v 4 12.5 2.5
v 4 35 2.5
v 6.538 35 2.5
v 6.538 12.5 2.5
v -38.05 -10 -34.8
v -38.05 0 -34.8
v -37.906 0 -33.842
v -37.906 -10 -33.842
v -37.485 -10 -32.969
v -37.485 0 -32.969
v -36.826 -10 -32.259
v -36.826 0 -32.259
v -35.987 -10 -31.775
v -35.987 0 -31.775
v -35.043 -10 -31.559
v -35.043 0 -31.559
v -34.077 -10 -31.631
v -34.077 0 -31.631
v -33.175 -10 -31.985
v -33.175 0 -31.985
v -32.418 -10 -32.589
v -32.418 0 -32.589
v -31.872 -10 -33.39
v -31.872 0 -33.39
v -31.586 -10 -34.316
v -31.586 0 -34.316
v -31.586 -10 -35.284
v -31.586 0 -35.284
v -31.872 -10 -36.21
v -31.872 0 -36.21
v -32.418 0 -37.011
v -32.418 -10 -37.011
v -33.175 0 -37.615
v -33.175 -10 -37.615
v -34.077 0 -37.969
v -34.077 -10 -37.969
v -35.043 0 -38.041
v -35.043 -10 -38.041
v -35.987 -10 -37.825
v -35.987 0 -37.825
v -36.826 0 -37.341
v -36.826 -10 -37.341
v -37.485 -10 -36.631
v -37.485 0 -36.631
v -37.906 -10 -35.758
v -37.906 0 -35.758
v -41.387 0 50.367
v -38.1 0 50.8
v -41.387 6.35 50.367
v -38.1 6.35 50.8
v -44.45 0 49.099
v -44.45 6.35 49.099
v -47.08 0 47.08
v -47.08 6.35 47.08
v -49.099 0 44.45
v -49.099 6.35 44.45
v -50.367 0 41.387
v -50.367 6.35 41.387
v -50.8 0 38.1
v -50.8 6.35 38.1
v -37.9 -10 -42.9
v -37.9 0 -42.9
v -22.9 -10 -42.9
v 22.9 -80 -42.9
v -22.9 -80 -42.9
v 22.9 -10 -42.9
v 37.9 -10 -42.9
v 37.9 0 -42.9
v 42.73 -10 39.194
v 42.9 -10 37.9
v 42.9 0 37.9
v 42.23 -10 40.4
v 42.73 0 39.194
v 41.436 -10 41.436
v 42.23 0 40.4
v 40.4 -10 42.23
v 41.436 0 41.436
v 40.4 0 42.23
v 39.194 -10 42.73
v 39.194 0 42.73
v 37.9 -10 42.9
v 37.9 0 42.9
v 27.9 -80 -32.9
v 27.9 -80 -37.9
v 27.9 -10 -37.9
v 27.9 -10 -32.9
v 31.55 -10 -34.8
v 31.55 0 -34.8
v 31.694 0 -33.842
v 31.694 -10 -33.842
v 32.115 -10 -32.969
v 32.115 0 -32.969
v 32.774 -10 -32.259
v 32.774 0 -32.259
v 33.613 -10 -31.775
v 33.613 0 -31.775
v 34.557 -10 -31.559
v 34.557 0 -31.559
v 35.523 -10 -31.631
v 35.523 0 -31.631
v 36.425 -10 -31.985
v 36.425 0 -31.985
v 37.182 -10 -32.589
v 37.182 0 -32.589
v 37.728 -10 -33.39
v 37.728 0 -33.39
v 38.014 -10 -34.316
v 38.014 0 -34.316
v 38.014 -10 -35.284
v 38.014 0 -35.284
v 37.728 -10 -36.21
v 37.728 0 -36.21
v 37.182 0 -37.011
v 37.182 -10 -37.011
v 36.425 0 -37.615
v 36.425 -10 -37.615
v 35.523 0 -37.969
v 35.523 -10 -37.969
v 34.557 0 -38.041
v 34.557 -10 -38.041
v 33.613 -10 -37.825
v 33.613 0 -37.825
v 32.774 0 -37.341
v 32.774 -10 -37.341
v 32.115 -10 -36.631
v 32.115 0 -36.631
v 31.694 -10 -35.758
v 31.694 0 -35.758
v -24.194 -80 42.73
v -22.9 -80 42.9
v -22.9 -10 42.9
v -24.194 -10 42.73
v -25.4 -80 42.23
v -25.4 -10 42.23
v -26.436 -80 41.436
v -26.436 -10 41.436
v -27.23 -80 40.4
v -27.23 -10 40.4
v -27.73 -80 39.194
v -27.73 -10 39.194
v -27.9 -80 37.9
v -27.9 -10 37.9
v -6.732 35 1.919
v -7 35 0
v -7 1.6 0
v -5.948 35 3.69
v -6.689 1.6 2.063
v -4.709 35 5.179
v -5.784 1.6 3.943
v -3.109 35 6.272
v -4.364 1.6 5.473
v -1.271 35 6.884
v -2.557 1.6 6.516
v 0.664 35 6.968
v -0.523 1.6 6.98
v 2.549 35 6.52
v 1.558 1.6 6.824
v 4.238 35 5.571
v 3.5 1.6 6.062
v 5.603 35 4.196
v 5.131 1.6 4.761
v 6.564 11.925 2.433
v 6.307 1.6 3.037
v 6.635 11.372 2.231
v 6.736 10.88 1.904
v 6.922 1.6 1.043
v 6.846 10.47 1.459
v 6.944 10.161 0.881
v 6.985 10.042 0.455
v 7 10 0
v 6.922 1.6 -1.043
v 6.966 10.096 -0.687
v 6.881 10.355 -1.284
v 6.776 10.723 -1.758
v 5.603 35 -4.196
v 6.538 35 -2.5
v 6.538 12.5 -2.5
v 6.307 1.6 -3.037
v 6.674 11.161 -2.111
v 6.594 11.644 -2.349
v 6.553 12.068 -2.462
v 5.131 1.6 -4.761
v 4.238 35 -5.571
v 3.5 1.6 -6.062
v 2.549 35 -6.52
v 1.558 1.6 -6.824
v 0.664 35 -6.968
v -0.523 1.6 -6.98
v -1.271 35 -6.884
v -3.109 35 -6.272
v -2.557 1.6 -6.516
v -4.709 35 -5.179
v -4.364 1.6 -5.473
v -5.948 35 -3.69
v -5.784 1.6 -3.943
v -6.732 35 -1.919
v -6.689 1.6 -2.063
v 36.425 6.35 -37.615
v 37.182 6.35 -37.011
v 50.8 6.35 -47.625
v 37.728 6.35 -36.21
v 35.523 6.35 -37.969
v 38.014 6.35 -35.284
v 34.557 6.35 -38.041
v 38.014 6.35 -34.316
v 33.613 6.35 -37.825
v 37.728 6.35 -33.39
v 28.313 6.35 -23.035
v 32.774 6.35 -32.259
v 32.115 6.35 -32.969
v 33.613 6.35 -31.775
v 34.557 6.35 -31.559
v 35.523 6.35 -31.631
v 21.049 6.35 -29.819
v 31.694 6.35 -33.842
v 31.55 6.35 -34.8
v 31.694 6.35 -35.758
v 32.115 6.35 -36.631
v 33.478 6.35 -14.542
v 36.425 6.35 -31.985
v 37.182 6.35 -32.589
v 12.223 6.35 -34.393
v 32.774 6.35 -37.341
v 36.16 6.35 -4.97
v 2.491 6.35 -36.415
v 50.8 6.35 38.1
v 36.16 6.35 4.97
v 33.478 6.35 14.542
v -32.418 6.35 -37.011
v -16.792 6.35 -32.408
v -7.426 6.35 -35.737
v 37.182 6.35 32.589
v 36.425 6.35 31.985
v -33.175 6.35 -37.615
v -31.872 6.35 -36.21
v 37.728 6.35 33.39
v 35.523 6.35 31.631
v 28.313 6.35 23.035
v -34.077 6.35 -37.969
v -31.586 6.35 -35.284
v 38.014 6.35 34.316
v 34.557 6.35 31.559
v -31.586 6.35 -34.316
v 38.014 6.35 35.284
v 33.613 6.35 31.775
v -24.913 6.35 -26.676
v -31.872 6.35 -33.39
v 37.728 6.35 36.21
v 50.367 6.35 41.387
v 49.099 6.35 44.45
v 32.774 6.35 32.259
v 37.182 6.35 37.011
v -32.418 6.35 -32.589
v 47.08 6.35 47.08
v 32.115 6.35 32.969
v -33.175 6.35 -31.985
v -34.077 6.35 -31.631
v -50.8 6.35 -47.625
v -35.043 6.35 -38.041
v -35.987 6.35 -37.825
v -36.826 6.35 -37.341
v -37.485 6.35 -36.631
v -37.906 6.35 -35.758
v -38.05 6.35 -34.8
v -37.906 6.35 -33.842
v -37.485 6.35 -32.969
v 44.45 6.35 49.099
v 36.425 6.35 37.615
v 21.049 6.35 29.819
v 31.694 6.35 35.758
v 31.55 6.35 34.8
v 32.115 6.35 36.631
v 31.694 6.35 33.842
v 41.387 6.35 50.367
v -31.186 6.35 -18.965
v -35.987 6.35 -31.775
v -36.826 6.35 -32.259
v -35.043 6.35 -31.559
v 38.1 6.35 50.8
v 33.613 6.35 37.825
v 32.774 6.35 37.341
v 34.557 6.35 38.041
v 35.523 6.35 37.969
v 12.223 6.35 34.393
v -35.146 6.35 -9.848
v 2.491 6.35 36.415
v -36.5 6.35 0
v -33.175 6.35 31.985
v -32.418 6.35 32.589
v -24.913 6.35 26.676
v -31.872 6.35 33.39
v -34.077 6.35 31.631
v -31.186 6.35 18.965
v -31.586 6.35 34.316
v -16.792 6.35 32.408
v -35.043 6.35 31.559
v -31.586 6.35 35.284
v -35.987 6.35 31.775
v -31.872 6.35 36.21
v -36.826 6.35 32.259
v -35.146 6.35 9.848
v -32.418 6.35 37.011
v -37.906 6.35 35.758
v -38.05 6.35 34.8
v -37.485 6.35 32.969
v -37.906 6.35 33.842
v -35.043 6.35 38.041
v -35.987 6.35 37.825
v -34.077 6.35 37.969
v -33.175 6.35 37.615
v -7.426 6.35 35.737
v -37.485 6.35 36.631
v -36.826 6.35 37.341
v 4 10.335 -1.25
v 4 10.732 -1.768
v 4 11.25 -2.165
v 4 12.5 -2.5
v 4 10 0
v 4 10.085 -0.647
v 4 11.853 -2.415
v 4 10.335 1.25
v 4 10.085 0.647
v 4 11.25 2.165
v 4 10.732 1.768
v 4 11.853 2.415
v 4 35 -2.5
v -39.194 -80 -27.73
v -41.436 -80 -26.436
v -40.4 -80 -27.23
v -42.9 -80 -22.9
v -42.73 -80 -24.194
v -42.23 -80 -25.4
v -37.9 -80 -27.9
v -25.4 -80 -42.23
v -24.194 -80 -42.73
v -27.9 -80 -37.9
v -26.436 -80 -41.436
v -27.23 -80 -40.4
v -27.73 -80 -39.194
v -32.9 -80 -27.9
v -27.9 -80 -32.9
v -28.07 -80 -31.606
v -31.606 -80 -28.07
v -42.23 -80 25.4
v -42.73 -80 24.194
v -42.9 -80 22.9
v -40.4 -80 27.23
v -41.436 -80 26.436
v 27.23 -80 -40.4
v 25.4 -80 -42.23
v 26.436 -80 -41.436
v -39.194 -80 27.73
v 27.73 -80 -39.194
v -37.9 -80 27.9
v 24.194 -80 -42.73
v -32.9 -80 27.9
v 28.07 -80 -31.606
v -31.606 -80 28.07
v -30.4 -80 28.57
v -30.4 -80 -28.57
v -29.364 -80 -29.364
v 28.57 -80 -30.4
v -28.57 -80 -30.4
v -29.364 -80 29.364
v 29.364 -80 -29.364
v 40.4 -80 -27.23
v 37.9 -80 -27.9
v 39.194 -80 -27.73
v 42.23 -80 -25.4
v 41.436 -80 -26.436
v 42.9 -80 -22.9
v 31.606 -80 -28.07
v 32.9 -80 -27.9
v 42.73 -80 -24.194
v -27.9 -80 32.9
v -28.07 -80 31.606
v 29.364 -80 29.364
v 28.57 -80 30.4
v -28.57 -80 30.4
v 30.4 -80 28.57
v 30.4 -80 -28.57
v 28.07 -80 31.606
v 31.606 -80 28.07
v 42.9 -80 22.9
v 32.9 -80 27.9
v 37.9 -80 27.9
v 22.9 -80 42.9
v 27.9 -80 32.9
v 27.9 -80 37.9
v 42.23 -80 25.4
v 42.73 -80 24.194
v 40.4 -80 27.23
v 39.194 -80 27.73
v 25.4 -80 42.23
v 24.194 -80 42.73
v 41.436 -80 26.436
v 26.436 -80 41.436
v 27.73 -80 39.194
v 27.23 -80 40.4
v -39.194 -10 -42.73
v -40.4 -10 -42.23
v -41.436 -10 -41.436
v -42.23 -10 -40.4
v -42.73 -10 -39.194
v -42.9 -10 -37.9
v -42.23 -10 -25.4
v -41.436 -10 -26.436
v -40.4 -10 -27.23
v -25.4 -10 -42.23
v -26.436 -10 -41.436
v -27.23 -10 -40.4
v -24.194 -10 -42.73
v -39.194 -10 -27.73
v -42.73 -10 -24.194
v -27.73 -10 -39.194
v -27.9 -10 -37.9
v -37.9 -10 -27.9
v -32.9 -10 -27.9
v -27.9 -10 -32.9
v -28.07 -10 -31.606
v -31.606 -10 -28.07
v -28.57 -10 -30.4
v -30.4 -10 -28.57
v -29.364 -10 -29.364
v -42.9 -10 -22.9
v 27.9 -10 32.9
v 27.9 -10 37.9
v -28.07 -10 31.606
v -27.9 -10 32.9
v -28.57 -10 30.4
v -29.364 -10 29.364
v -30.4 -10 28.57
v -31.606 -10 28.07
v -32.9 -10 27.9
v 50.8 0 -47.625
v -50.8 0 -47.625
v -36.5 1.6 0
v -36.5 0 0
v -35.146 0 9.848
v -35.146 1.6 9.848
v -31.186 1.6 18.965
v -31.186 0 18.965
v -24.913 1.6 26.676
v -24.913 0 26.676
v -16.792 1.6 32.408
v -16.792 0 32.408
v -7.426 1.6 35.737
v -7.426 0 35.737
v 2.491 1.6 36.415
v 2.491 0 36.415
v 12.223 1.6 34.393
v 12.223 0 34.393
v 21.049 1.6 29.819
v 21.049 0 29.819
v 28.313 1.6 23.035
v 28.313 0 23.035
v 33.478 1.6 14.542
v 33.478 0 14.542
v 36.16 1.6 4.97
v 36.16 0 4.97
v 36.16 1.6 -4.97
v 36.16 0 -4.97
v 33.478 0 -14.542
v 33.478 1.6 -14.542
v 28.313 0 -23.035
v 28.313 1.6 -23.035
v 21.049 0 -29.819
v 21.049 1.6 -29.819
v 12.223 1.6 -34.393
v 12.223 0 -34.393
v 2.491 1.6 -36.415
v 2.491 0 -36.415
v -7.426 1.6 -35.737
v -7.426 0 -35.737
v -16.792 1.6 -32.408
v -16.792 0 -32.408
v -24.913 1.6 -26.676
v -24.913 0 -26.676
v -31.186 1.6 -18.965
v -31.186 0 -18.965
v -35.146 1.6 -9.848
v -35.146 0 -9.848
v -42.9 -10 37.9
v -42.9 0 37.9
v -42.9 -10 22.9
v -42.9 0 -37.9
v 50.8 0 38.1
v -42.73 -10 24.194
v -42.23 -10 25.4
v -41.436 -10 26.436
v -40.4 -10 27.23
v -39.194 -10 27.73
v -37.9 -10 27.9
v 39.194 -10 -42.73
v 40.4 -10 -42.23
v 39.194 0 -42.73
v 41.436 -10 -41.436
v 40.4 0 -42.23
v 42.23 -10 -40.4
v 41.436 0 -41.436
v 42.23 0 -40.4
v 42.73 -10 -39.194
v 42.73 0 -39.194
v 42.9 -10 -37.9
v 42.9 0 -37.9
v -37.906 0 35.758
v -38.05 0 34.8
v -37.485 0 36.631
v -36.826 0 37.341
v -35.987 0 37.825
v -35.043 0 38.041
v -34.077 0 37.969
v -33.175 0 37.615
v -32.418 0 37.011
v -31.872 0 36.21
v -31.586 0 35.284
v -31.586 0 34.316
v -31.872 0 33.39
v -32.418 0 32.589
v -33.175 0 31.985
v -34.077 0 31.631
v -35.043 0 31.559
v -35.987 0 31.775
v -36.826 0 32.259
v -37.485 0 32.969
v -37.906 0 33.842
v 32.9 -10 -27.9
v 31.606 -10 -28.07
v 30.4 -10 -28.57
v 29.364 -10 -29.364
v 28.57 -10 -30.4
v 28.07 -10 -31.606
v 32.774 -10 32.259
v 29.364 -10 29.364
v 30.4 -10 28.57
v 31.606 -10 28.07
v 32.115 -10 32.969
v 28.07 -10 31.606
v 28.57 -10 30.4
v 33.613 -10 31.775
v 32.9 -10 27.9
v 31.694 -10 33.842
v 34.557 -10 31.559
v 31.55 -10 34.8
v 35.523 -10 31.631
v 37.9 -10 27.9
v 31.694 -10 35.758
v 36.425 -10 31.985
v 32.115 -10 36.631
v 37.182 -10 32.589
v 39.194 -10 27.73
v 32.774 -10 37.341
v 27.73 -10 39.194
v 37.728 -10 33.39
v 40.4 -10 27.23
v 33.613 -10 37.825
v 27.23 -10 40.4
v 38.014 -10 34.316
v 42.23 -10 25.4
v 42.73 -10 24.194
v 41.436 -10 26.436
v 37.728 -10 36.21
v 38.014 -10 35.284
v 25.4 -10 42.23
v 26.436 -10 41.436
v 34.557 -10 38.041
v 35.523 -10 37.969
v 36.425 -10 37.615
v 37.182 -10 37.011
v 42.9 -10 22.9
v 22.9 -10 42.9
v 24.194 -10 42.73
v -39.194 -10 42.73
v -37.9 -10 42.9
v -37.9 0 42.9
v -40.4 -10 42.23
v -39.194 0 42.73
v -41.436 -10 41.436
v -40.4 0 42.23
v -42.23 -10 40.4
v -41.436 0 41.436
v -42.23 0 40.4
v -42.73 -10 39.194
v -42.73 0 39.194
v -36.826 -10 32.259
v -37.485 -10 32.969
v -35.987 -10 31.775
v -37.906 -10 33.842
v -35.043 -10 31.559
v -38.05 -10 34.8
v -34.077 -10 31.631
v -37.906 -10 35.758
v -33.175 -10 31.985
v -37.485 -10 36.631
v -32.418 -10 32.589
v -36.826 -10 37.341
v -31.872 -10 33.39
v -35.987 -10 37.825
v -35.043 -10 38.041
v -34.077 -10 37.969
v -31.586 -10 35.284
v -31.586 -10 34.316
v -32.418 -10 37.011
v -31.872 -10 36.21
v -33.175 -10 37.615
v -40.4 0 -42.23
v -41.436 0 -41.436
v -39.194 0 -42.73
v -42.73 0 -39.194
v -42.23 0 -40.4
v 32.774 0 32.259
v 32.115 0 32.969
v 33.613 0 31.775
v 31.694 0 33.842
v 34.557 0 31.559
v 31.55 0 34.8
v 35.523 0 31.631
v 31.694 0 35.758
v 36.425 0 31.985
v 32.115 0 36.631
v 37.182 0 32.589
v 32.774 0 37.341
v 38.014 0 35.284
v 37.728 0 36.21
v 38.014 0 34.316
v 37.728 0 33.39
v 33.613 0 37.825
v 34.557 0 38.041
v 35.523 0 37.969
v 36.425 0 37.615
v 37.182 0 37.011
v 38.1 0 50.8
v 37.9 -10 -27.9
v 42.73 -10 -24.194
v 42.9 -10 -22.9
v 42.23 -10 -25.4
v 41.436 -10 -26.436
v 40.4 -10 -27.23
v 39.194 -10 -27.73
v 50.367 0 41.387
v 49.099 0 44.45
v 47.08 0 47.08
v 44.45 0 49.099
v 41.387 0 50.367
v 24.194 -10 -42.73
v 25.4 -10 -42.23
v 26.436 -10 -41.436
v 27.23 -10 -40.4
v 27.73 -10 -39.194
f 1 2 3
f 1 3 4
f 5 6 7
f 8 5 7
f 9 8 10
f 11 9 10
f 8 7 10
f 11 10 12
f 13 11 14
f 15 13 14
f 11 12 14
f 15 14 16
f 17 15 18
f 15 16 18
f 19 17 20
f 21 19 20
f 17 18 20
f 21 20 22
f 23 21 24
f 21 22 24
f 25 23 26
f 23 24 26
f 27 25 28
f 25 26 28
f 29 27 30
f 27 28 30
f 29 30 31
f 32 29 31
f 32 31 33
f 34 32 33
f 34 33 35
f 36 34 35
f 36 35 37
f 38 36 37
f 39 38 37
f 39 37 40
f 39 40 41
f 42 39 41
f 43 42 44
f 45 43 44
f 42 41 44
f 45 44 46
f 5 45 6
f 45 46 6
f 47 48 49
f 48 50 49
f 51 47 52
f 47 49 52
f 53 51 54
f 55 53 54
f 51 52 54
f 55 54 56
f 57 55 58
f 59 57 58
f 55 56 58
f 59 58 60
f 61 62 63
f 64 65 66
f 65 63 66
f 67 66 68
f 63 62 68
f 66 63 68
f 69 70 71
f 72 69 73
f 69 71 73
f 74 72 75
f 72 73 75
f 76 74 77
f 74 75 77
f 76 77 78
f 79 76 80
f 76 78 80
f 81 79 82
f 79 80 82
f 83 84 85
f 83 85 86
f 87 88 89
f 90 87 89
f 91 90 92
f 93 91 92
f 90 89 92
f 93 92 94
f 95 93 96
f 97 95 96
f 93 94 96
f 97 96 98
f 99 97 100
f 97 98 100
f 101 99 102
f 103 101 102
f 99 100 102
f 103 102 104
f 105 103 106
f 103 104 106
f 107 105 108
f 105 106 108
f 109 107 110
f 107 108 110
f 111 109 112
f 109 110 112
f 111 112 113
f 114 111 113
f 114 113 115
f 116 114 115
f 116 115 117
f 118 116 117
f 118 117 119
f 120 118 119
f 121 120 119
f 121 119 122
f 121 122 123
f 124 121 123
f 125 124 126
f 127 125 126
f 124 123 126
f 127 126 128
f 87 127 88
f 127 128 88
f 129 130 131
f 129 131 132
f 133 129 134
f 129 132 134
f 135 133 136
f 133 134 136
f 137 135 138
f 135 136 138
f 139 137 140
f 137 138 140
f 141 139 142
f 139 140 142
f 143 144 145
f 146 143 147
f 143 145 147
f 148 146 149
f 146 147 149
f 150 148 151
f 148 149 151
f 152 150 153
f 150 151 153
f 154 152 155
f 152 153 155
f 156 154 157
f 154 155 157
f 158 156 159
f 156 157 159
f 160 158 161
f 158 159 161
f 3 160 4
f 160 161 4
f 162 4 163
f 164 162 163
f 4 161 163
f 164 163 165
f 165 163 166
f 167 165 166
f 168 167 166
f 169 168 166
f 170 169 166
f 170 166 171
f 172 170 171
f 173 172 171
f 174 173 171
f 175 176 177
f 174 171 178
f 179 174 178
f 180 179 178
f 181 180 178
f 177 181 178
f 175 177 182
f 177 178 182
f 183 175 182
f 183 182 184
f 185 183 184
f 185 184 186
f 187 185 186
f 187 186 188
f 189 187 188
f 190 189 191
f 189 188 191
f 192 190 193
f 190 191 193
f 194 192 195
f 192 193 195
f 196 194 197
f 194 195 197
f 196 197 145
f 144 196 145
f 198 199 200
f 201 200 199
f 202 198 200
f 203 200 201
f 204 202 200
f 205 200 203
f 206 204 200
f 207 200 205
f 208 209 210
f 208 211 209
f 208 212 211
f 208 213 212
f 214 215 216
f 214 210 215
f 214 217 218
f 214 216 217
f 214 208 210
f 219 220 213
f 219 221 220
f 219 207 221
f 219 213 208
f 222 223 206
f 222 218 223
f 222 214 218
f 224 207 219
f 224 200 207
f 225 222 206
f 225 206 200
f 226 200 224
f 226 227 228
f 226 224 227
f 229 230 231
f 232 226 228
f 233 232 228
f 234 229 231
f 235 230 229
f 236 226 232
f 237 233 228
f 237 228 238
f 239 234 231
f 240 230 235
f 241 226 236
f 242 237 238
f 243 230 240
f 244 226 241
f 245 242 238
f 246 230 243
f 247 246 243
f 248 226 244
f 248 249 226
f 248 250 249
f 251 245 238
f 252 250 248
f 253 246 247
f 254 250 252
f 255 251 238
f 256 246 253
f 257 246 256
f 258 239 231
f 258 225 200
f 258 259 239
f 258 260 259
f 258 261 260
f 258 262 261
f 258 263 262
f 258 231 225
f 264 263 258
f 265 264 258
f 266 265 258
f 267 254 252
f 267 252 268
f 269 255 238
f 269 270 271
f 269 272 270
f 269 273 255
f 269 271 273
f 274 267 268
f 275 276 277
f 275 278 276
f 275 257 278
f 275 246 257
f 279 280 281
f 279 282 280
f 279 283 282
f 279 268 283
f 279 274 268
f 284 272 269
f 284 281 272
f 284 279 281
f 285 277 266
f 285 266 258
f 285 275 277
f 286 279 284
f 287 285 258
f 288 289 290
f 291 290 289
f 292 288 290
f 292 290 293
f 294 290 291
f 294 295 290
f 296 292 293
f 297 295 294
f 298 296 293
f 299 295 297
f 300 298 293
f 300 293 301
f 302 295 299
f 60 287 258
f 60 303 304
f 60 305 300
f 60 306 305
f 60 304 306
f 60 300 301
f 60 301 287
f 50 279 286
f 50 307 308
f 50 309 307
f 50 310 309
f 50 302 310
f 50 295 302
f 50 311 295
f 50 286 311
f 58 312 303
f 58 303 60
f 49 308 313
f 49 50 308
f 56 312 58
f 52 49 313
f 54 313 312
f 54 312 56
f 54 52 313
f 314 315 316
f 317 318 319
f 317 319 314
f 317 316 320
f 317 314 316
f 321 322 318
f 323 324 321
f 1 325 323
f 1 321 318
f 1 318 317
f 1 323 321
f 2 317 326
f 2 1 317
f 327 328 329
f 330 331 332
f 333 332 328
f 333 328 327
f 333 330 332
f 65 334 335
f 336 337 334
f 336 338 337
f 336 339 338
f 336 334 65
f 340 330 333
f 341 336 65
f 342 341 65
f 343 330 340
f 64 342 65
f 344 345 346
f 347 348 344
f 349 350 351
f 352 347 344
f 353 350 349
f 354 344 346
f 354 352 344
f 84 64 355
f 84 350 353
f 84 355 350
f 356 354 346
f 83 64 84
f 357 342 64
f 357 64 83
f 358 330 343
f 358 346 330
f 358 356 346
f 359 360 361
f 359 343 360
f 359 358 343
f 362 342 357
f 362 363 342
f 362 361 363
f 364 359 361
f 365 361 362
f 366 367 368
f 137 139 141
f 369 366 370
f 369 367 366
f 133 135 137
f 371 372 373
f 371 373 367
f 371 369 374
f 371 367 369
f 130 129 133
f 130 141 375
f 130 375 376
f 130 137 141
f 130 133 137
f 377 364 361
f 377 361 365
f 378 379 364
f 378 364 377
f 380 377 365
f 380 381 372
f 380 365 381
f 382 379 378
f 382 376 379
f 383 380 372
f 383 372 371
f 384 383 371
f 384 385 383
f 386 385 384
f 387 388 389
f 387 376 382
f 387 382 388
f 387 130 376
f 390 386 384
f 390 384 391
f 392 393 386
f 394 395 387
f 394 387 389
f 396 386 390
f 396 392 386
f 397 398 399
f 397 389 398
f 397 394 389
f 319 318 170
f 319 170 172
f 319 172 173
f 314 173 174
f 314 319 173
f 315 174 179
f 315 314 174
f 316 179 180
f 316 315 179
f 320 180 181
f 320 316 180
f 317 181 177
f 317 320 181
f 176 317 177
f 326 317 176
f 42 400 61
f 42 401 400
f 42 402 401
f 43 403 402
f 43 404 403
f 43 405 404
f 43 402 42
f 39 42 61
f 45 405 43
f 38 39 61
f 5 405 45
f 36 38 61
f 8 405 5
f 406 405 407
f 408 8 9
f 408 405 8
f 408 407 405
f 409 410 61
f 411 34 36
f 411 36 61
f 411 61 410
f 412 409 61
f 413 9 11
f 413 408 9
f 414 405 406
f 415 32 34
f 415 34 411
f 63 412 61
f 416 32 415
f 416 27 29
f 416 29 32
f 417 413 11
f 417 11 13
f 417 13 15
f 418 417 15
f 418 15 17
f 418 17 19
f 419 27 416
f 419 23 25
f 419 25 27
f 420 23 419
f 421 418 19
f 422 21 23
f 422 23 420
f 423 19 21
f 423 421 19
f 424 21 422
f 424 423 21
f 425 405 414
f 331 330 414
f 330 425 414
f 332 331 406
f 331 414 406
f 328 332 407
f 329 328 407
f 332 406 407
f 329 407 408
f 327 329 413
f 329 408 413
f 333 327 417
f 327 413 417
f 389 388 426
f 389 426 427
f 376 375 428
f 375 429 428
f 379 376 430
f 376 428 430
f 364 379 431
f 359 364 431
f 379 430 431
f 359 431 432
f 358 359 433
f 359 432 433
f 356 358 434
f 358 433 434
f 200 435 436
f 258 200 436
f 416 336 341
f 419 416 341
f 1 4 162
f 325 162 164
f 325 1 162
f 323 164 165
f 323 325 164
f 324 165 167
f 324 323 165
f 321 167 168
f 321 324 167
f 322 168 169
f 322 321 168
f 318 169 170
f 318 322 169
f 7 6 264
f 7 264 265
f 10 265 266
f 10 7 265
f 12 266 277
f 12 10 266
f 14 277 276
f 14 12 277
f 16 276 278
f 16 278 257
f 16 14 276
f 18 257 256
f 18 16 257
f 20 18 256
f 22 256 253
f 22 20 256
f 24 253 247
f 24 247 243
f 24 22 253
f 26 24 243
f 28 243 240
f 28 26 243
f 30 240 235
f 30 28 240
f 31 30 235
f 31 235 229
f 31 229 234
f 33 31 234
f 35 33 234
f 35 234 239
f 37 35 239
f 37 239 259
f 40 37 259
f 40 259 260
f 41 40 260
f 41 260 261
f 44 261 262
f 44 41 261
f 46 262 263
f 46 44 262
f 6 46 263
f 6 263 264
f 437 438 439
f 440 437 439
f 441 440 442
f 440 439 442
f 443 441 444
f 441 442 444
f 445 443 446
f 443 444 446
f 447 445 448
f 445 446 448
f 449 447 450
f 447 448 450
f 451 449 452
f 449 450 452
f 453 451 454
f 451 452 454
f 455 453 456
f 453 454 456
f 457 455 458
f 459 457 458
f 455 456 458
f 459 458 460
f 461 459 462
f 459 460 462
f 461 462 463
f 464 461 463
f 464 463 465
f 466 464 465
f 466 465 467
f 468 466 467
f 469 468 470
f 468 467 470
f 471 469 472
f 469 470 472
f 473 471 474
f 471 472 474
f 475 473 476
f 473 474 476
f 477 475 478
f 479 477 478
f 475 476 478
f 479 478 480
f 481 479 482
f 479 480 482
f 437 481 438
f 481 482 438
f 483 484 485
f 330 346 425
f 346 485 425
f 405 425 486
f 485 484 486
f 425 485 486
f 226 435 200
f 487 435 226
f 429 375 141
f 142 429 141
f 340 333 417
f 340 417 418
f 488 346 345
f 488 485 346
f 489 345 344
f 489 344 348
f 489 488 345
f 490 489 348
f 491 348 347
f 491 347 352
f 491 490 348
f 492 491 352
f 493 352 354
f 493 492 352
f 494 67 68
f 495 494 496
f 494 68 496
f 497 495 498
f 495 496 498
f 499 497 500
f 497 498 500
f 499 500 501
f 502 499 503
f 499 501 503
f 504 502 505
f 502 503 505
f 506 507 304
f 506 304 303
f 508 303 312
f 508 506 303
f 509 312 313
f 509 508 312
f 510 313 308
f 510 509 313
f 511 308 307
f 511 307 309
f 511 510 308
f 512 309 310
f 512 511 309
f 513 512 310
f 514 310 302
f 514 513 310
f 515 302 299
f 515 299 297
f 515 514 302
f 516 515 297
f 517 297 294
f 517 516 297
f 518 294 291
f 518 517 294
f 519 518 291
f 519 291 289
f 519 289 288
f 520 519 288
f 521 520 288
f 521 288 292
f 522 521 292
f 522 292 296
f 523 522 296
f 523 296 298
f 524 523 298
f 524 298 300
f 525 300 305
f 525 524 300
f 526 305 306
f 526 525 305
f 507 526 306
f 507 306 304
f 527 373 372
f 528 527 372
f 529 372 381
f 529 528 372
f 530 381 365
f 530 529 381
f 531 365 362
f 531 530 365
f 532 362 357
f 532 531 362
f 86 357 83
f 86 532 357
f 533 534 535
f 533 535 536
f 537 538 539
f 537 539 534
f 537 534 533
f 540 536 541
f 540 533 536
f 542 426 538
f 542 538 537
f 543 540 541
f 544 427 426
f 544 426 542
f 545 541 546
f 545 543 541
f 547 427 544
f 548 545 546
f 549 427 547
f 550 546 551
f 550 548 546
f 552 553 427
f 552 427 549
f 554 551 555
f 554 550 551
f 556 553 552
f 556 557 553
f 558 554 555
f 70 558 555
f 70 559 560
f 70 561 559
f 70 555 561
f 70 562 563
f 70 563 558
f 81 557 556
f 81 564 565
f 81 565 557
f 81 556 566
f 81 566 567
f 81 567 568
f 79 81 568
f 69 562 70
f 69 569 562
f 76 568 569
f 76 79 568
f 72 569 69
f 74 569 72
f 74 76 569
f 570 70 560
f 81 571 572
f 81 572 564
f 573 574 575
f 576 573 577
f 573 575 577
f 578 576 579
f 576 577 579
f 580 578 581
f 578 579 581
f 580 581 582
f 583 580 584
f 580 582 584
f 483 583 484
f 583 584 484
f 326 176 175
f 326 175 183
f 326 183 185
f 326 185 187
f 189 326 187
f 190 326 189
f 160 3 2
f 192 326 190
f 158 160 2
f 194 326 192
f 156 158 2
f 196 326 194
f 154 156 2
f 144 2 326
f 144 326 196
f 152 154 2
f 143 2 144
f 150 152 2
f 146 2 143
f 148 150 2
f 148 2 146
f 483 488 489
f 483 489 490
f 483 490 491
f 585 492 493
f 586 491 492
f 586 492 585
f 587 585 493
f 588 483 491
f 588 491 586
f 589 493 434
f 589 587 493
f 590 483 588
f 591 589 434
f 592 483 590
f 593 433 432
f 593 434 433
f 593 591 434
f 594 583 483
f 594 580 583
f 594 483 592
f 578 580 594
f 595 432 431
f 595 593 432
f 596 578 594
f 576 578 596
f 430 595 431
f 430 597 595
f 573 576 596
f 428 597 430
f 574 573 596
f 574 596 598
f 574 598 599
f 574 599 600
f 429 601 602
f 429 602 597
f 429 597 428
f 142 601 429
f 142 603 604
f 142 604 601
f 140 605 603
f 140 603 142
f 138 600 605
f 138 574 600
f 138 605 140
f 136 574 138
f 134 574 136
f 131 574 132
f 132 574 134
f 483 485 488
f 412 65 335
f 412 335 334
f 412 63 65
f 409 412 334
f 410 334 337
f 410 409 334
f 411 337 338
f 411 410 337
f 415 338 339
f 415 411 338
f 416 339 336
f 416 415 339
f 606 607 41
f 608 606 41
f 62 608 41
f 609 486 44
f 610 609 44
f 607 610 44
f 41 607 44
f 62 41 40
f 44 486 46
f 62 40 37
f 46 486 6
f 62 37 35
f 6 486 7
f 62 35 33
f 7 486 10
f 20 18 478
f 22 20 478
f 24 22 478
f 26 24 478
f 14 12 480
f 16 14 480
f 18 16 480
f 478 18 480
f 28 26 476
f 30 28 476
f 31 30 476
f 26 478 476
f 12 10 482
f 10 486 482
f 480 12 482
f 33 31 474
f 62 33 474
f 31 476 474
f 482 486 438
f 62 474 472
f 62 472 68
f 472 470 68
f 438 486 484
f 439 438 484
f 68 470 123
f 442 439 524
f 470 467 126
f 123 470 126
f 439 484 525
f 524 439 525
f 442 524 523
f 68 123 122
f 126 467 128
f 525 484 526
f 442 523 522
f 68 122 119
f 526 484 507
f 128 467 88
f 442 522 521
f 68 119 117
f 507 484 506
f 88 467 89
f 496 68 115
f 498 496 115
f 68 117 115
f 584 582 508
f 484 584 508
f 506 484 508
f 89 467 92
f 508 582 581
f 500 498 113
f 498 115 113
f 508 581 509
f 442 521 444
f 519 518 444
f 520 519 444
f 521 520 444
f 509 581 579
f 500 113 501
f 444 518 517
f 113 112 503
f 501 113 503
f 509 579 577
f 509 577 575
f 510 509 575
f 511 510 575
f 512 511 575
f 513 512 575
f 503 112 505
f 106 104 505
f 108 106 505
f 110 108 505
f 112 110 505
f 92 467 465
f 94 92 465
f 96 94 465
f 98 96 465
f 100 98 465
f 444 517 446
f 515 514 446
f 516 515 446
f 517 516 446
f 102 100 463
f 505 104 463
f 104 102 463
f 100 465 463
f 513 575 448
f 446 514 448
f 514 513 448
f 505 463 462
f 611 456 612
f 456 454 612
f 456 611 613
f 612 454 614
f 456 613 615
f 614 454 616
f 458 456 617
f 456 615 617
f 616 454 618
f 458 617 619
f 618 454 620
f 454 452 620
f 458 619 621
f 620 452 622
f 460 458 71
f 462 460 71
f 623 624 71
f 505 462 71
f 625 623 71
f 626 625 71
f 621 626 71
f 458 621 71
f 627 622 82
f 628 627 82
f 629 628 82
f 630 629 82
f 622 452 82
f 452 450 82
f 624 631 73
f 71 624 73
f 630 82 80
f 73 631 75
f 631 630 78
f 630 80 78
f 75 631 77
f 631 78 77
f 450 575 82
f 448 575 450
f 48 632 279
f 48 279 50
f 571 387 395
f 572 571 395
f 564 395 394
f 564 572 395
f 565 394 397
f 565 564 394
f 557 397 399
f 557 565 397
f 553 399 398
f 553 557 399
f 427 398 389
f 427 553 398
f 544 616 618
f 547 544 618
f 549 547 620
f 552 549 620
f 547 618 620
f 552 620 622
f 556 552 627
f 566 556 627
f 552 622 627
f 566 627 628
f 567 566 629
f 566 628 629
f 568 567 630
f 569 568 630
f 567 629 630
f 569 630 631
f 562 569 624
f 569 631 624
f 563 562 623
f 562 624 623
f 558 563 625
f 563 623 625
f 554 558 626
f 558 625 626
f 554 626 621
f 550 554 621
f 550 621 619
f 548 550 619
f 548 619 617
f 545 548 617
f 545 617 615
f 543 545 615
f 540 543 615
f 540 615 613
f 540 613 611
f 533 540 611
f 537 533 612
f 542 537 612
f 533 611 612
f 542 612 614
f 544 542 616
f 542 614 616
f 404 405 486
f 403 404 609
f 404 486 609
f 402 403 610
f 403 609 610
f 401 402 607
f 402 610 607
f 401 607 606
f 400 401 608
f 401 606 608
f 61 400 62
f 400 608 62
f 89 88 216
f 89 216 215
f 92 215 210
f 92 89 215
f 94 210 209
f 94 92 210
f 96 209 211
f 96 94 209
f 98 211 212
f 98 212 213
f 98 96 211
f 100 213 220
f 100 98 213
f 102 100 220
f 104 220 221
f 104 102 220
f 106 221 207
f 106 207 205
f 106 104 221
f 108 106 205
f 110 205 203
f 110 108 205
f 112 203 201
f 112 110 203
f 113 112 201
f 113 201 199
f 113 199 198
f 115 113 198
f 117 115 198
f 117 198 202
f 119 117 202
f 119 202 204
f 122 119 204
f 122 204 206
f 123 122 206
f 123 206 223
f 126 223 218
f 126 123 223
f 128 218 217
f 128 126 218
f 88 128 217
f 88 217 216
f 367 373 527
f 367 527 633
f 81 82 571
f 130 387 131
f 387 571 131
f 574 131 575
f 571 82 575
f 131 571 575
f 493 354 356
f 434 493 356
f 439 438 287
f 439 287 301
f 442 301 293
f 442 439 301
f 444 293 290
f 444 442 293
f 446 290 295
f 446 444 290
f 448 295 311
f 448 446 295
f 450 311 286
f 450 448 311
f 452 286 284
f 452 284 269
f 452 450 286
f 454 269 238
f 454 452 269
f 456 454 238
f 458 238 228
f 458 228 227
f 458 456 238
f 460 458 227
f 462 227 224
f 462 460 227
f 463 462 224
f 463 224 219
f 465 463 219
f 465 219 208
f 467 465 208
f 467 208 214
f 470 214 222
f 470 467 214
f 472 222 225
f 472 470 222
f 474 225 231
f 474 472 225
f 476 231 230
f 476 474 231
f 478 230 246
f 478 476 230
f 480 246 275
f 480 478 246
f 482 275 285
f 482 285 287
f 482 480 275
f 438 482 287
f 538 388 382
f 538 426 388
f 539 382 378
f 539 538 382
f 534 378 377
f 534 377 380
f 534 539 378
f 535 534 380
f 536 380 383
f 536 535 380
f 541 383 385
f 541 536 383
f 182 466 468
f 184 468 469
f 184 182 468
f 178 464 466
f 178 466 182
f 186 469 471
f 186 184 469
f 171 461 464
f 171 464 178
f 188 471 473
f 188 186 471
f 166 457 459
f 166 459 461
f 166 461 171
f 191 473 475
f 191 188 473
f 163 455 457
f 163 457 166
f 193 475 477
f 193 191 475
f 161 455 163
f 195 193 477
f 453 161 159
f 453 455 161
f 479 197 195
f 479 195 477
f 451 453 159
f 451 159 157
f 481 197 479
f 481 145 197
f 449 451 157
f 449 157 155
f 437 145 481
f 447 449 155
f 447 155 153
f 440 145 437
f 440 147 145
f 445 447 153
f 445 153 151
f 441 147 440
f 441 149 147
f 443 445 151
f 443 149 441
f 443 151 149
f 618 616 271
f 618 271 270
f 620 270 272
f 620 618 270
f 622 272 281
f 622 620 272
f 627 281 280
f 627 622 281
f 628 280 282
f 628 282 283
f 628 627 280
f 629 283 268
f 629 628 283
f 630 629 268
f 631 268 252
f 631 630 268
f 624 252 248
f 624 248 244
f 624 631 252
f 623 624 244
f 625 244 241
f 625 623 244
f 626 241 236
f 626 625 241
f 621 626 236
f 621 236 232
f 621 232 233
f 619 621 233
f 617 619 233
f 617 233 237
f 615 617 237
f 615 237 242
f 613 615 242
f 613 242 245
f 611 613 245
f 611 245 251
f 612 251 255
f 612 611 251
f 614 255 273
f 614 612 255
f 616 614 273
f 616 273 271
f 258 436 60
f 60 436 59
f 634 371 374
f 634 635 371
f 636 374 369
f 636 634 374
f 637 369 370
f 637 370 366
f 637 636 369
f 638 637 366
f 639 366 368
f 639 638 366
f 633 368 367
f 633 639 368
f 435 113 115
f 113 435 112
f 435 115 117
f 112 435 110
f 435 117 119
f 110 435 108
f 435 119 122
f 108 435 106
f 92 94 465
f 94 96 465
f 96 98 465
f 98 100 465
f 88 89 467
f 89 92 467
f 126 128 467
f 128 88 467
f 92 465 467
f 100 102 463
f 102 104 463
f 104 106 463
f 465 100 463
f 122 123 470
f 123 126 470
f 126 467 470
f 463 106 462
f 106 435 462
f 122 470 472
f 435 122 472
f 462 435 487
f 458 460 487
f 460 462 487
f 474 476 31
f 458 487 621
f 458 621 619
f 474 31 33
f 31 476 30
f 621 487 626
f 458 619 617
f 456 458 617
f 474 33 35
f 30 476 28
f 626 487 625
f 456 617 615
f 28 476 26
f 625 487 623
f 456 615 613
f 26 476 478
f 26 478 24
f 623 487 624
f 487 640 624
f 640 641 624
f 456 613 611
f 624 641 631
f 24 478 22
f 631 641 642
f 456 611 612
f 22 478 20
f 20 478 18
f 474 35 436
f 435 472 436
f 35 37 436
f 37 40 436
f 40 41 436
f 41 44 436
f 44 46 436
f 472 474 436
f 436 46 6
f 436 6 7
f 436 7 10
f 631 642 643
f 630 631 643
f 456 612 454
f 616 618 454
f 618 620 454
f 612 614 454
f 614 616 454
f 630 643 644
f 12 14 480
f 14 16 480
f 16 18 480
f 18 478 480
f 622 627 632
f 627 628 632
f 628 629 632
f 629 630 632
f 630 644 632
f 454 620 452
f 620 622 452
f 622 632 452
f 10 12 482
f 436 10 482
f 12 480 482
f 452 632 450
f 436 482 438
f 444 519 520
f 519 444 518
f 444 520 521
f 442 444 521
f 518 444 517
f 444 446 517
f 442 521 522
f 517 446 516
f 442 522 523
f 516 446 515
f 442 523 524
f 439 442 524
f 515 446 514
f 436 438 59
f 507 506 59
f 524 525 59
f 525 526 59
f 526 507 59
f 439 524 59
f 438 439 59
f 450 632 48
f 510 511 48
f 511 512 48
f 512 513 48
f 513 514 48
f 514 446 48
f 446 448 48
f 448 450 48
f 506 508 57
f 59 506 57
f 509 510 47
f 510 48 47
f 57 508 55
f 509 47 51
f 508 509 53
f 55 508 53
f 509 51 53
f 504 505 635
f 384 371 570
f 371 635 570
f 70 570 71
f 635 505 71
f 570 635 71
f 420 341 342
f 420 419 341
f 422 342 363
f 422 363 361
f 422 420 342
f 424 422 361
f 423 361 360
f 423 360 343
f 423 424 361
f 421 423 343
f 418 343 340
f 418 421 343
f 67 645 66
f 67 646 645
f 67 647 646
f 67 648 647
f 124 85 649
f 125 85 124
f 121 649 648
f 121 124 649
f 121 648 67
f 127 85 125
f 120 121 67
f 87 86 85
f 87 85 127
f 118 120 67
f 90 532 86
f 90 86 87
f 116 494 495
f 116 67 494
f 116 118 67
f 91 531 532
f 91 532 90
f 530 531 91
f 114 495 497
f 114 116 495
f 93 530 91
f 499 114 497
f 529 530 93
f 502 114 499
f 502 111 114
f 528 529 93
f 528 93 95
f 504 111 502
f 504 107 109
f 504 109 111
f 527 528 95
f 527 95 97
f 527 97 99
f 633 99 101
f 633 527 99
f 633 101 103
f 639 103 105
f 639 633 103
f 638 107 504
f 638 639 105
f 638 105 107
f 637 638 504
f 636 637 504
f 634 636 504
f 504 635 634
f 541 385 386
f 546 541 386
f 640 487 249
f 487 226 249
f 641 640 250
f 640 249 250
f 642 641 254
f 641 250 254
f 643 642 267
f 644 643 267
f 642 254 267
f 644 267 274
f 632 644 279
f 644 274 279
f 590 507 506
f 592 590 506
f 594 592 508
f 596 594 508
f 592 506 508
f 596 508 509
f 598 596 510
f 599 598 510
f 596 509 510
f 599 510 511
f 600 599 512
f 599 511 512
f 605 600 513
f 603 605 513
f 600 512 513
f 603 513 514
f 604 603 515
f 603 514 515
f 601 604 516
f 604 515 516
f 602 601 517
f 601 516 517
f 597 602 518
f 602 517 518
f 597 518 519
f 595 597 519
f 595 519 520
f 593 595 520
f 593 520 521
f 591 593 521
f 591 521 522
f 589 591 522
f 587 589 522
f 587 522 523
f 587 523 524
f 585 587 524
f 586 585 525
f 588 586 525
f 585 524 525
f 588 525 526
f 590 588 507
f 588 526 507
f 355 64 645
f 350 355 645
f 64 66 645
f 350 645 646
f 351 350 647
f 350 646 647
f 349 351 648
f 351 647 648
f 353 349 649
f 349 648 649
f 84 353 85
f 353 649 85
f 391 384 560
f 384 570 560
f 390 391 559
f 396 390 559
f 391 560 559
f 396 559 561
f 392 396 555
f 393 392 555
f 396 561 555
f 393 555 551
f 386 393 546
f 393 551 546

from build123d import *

# Parameters (mm, degrees)
F1_DEPTH  = 80
F2_W      = 15
F2_H      = 15
F3_DEPTH  = 70
F4_R      = 3.25
F5_DEPTH  = 10
F6_R      = 5
F7_R      = 36.5
F8_DEPTH  = 1.6
F9_R      = 7
F10_DEPTH = 35
F13_DEPTH = 5
F14_W     = 101.6
F14_H     = 98.425
F14_R     = 3.25
F14_R_2   = 36.5
F15_DEPTH = 6.35
F16_R     = 12.7


with BuildPart() as f1:
    # F0 (on Front) → F1 (new body)
    with BuildSketch(Plane.XZ):
        with BuildLine():
            Line((37.9, 42.9), (-37.9, 42.9))
            ThreePointArc((-37.9, 42.9), (-41.4355339059, 41.4355339059), (-42.9, 37.9))
            Line((-42.9, 37.9), (-42.9, -37.9))
            ThreePointArc((-42.9, -37.9), (-41.4355339059, -41.4355339059), (-37.9, -42.9))
            Line((-37.9, -42.9), (37.9, -42.9))
            ThreePointArc((37.9, -42.9), (41.4355339059, -41.4355339059), (42.9, -37.9))
            Line((42.9, -37.9), (42.9, 37.9))
            ThreePointArc((42.9, 37.9), (41.4355339059, 41.4355339059), (37.9, 42.9))
        make_face()
    extrude(amount=F1_DEPTH)

    # F2 (on face) → F3 (cut)
    with BuildSketch(Plane.XZ.offset(80)):
        with Locations((35.4, 35.4)):
            Rectangle(F2_W, F2_H)
        with Locations((-35.4, 35.4)):
            Rectangle(F2_W, F2_H)
        with Locations((-35.4, -35.4)):
            Rectangle(F2_W, F2_H)
        with Locations((35.4, -35.4)):
            Rectangle(F2_W, F2_H)
    extrude(amount=-F3_DEPTH, mode=Mode.SUBTRACT)

    # F4 (on face) → F5 (cut, through all)
    with BuildSketch(Plane(origin=(0, 0, 0), x_dir=(-1, 0, 0), z_dir=(0, 1, 0))):
        with Locations((34.8, 34.8)):
            Circle(F4_R)
        with Locations((-34.8, 34.8)):
            Circle(F4_R)
        with Locations((34.8, -34.8)):
            Circle(F4_R)
        with Locations((-34.8, -34.8)):
            Circle(F4_R)
    extrude(amount=-F5_DEPTH, mode=Mode.SUBTRACT)

    # F6
    f6_edges = [f1.edges().sort_by_distance(p)[0] for p in [
        (-42.9, -45, 27.9),
        (-42.9, -45, -27.9),
        (-27.9, -45, -27.9),
        (-27.9, -45, -42.9),
        (27.9, -45, -42.9),
        (-27.9, -45, 42.9),
        (27.9, -45, -27.9),
        (42.9, -45, -27.9),
        (42.9, -45, 27.9),
        (27.9, -45, 42.9),
        (27.9, -45, 27.9),
        (-27.9, -45, 27.9),
    ]]
    fillet(f6_edges, radius=F6_R)

    # F7 (on face) → F8 (join)
    with BuildSketch(Plane(origin=(0, 0, 0), x_dir=(-1, 0, 0), z_dir=(0, 1, 0))):
        Circle(F7_R)
    extrude(amount=F8_DEPTH)

    # F9 (on face) → F10 (join)
    with BuildSketch(Plane(origin=(0, 0, 0), x_dir=(-1, 0, 0), z_dir=(0, 1, 0))):
        Circle(F9_R)
    extrude(amount=F10_DEPTH)

    # F12 (on offset) → F13 (cut)
    with BuildSketch(Plane.YZ.offset(4)):
        with BuildLine():
            Line((35, 2.5), (12.5, 2.5))
            ThreePointArc((12.5, 2.5), (10.732233047, 1.767766953), (10, 0))
            ThreePointArc((10, 0), (10.732233047, -1.767766953), (12.5, -2.5))
            Line((12.5, -2.5), (35, -2.5))
            Line((35, -2.5), (35, 0))
            Line((35, 0), (35, 2.5))
        make_face()
    extrude(amount=F13_DEPTH, mode=Mode.SUBTRACT)


with BuildPart() as f15:
    # F14 (on face) → F15 (new body)
    with BuildSketch(Plane(origin=(0, 0, 0), x_dir=(-1, 0, 0), z_dir=(0, 1, 0))):
        with Locations((0, 1.5875)):
            Rectangle(F14_W, F14_H)
        with Locations((-34.8, -34.8)):
            Circle(F14_R, mode=Mode.SUBTRACT)
        Circle(F14_R_2, mode=Mode.SUBTRACT)
        with Locations((34.8, -34.8)):
            Circle(F14_R, mode=Mode.SUBTRACT)
        with Locations((-34.8, 34.8)):
            Circle(F14_R, mode=Mode.SUBTRACT)
        with Locations((34.8, 34.8)):
            Circle(F14_R, mode=Mode.SUBTRACT)
    extrude(amount=F15_DEPTH)

    # F16
    f16_edges = [f15.edges().sort_by_distance(p)[0] for p in [
        (-50.8, 3.175, 50.8),
        (50.8, 3.175, 50.8),
    ]]
    fillet(f16_edges, radius=F16_R)


solid = Compound([f1.part, f15.part])
